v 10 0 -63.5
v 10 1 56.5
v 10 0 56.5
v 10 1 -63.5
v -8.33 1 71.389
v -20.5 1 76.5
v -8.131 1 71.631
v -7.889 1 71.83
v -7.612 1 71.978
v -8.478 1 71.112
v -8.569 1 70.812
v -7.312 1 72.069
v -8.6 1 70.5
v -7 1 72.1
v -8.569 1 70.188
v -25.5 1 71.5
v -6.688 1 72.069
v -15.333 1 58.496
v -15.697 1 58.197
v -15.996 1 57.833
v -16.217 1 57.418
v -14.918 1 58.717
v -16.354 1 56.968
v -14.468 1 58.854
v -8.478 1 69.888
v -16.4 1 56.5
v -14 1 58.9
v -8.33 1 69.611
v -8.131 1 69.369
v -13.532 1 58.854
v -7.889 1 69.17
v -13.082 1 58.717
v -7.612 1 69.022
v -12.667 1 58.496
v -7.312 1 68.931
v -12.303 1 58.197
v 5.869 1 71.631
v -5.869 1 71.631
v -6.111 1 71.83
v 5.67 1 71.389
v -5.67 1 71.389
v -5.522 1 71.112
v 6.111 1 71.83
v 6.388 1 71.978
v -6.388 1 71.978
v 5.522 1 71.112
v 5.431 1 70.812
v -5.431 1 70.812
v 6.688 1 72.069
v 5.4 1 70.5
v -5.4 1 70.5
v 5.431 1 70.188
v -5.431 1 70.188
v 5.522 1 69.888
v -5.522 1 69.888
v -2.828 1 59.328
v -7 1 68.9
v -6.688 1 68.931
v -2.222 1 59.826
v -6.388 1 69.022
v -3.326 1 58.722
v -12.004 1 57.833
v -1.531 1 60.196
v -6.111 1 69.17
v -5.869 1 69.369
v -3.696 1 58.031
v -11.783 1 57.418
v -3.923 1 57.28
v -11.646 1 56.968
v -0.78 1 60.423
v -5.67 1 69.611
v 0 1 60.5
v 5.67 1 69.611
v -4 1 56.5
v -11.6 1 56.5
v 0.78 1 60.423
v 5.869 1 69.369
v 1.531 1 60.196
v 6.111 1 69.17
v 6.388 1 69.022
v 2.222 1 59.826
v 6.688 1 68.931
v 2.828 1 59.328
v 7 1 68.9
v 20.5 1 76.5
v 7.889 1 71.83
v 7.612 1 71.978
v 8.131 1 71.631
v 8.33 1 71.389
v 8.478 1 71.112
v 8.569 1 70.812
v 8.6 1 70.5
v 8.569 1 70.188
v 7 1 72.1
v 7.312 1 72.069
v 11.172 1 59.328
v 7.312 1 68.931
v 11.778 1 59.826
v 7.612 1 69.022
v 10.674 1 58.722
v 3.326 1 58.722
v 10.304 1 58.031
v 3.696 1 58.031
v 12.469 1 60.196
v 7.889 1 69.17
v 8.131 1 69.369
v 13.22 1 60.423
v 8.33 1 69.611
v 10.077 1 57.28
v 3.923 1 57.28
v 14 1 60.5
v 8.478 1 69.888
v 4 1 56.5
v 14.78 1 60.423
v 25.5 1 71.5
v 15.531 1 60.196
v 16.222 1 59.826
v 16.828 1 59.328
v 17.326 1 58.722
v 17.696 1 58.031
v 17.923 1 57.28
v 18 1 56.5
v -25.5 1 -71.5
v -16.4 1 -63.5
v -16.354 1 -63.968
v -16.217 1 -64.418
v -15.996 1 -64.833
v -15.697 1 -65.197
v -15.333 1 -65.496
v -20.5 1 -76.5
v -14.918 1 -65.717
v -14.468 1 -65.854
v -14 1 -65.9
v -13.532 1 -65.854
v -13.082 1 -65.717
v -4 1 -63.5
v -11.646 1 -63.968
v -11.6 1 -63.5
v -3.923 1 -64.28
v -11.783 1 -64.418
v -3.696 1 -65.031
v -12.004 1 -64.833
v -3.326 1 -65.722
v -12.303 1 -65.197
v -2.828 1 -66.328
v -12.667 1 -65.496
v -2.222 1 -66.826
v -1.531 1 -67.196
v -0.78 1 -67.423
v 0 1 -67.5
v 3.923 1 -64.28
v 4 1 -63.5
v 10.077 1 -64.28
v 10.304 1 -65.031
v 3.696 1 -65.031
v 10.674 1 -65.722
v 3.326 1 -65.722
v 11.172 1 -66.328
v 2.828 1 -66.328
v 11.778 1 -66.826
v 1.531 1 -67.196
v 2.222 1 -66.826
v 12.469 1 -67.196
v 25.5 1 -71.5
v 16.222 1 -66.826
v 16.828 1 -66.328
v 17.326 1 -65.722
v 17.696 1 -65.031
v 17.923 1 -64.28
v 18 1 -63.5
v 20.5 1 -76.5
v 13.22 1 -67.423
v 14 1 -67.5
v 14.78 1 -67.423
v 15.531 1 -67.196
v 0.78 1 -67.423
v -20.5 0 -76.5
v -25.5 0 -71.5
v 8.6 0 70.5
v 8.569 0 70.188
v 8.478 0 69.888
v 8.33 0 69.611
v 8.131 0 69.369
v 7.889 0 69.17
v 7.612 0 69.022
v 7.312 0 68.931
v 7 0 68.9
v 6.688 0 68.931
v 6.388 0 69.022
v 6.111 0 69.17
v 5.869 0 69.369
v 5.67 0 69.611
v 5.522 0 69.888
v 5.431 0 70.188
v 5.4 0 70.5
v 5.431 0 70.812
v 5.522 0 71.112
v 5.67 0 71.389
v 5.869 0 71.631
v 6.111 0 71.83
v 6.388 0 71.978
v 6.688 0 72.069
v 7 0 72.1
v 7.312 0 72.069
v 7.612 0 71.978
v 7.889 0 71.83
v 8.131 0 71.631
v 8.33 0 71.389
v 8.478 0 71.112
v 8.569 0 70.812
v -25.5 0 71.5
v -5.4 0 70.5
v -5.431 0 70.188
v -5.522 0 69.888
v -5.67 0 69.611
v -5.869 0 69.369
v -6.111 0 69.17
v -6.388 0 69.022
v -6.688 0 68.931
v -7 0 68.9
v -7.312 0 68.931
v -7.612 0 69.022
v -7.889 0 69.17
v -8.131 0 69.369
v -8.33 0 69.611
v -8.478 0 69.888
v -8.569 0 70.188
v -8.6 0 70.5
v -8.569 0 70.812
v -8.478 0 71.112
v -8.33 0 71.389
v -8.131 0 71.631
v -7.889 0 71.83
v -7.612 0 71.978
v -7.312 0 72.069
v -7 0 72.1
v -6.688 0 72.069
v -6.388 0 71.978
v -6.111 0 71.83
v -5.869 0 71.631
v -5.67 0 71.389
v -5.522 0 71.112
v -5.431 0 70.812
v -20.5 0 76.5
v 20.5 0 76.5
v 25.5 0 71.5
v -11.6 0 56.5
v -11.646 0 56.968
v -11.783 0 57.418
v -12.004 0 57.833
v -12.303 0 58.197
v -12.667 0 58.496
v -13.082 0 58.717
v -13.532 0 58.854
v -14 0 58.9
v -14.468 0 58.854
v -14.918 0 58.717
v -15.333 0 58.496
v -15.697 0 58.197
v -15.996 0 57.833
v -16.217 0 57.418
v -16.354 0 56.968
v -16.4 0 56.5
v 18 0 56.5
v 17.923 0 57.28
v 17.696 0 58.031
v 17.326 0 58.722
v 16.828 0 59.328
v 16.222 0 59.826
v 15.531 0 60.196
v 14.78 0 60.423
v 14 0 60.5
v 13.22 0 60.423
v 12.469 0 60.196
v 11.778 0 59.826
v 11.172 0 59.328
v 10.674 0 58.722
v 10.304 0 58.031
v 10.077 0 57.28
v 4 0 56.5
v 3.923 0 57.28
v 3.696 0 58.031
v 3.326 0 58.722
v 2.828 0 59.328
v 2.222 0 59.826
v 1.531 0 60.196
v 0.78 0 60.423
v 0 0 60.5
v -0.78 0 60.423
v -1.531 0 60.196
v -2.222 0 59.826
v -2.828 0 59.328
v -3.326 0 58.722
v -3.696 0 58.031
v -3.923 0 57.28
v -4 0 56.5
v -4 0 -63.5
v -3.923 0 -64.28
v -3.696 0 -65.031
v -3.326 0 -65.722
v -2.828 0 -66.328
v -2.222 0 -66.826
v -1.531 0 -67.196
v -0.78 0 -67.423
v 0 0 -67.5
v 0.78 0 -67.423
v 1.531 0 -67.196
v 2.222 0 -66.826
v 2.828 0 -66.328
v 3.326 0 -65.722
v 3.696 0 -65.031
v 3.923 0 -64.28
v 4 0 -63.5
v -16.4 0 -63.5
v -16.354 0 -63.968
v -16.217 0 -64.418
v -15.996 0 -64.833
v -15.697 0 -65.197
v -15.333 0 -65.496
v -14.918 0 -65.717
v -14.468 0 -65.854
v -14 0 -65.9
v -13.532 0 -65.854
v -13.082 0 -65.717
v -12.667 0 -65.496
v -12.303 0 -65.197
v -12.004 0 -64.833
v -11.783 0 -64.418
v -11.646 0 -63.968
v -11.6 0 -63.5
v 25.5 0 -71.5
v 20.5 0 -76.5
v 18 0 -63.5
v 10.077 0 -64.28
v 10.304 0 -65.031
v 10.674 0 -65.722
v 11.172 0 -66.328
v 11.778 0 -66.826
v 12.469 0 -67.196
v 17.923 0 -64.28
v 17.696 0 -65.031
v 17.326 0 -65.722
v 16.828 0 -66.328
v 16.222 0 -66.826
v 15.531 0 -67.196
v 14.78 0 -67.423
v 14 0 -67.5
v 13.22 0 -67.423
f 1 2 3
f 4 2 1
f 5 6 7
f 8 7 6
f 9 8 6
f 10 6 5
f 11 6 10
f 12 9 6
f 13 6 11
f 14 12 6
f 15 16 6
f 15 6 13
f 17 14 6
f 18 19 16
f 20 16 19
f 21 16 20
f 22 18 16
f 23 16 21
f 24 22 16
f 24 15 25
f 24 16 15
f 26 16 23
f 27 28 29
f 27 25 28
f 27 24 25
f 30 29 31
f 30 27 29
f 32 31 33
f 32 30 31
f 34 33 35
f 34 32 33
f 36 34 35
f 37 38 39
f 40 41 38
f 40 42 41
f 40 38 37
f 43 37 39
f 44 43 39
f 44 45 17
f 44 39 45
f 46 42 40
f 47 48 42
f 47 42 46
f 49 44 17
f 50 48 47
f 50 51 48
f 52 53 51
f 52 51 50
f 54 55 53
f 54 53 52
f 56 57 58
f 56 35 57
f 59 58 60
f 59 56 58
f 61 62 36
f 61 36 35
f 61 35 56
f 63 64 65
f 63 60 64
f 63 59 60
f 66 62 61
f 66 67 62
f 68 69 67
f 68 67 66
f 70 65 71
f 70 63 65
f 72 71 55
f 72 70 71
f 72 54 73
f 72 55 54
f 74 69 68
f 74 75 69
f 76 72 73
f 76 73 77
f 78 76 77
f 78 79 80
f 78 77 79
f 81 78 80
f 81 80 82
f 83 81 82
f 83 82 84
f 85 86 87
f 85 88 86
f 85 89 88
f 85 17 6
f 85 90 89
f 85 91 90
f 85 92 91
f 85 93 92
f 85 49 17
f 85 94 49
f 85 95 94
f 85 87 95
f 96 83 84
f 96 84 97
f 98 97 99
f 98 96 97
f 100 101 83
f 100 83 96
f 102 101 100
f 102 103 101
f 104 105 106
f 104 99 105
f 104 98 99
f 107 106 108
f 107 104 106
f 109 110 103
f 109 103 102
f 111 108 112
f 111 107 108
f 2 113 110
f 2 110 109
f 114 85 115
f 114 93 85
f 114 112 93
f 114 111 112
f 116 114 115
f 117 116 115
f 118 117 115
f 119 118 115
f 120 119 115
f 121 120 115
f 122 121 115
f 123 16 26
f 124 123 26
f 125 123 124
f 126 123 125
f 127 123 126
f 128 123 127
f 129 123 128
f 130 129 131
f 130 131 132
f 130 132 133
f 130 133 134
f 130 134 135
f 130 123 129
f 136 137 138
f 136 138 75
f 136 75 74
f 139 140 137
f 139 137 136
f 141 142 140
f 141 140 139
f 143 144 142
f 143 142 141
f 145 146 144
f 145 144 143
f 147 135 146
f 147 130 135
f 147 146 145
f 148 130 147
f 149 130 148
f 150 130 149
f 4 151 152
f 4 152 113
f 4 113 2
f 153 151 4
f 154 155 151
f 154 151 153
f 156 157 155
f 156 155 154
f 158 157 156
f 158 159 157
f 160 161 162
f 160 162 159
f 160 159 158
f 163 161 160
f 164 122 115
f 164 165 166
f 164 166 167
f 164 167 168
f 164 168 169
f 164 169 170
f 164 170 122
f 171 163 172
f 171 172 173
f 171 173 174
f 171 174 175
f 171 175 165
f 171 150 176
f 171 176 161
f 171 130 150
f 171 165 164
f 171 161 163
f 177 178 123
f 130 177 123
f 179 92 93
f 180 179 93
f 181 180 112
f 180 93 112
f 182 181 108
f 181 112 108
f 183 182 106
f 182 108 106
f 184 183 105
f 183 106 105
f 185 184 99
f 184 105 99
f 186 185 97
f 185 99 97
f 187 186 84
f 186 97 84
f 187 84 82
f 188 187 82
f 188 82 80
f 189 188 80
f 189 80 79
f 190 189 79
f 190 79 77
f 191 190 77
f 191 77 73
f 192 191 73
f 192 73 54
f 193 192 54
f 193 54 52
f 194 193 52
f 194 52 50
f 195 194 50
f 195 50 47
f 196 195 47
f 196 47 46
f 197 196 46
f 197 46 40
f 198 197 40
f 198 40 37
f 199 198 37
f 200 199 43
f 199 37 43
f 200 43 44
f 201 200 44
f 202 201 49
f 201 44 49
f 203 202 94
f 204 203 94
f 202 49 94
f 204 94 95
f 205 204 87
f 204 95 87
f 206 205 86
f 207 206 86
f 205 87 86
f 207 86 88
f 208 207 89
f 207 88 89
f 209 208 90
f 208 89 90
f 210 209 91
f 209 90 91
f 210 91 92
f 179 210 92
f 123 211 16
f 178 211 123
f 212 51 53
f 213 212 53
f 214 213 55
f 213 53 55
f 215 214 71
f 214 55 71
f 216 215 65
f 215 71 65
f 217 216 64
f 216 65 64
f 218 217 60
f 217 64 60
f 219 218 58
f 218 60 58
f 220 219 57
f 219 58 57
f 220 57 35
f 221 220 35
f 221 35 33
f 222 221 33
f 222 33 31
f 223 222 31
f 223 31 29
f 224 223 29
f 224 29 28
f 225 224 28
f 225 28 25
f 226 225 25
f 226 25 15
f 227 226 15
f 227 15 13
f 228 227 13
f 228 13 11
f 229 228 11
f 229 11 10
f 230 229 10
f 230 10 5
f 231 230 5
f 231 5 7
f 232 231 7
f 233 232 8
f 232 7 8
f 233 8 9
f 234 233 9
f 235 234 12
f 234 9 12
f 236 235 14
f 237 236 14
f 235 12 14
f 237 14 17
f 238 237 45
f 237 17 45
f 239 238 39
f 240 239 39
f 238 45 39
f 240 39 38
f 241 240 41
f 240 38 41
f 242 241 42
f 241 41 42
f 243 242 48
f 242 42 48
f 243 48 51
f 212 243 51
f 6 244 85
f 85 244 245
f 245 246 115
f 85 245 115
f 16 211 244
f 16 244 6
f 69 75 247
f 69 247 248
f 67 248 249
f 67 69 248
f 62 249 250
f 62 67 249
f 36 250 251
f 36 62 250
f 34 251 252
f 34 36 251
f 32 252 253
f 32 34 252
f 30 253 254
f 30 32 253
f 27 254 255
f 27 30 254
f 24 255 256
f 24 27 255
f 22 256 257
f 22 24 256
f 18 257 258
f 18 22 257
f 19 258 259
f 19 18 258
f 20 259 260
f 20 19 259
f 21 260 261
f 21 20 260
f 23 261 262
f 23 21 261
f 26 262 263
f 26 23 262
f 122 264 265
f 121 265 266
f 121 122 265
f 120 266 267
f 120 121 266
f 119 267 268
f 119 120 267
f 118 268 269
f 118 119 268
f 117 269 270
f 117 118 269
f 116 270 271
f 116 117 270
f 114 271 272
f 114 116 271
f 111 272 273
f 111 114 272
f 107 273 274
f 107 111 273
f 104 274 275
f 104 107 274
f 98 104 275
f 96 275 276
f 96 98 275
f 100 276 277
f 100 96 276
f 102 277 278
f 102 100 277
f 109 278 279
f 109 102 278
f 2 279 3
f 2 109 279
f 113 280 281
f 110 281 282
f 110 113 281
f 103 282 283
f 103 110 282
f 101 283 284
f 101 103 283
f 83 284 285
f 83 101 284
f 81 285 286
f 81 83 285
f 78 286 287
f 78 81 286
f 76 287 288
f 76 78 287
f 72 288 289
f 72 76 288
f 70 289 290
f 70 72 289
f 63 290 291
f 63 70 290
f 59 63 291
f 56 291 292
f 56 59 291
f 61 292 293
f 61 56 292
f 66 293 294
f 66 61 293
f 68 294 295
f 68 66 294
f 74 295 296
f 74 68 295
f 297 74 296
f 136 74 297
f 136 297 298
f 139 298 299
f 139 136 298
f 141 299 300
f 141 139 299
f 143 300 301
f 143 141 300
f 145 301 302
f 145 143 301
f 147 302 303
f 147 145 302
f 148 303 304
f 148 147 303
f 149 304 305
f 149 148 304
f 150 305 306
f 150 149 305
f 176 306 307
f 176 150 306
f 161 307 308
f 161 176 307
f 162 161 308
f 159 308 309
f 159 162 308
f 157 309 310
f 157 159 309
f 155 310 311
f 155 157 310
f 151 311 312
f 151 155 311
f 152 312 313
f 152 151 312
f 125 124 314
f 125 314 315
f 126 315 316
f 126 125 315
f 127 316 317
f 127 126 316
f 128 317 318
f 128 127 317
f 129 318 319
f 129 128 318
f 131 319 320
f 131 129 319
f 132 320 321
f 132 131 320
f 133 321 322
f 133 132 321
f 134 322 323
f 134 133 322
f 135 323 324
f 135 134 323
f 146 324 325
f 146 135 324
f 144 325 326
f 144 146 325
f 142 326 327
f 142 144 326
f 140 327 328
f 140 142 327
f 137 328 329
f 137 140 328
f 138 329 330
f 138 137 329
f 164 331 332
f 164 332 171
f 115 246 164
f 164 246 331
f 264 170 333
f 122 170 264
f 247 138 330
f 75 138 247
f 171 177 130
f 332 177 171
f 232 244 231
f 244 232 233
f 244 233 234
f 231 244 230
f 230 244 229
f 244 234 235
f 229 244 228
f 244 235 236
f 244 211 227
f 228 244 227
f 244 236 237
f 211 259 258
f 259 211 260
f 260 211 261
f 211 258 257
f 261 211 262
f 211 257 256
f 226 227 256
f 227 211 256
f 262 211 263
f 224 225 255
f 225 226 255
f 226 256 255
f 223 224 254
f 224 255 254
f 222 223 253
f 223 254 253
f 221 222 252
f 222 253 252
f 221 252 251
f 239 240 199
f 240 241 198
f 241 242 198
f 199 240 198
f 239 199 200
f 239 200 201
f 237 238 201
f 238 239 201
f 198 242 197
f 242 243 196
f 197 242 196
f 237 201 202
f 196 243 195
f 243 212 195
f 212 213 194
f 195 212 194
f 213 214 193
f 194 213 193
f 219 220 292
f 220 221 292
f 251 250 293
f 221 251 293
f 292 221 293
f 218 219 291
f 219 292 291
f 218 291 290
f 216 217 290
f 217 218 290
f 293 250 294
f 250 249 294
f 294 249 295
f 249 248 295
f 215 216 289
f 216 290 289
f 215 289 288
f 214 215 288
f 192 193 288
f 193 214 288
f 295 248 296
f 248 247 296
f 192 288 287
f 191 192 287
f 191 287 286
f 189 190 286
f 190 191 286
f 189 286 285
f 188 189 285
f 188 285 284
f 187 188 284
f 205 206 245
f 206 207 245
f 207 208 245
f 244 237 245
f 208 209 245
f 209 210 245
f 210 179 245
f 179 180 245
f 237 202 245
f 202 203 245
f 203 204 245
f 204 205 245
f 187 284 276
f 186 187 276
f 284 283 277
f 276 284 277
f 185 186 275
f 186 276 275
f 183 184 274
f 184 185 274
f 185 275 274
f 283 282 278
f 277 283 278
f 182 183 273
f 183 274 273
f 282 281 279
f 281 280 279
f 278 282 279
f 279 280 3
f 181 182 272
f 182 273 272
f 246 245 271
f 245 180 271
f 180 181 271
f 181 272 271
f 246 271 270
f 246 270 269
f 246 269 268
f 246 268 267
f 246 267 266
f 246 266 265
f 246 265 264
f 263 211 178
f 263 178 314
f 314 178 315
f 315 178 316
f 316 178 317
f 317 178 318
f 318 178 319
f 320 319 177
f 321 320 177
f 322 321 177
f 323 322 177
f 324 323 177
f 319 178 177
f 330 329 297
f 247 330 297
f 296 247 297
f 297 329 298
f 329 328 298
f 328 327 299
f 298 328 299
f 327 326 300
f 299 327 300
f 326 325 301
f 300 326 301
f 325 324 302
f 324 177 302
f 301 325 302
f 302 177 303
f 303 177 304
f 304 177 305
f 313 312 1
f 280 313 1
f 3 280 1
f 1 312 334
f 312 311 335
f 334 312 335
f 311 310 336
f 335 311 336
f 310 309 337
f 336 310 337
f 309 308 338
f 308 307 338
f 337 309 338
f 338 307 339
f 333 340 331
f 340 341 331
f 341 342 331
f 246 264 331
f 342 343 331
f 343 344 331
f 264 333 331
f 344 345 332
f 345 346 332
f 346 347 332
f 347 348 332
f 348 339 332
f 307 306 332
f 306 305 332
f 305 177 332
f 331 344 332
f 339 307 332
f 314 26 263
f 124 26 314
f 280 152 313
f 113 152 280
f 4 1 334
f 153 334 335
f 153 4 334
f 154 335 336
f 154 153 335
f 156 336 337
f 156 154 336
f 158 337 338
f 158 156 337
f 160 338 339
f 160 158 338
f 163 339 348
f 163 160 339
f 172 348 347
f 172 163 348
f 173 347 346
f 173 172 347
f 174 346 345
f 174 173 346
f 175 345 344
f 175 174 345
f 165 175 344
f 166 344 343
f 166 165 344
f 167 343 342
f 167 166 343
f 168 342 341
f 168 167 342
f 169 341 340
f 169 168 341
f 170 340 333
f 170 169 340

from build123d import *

# Parameters (mm, degrees)
SKETCH_1_W          = 51
SKETCH_1_H          = 153
EXTRUDE_1_DEPTH     = 1
SKETCH_2_R          = 1.6
CUT_EXTRUDE_1_DEPTH = 2
CHAMFER_1_SIZE      = 5
EXTRUDE_2_DEPTH     = 1


with BuildPart() as part:
    # 草图1 → 凸台-拉伸1 (new body)
    with BuildSketch(Plane(origin=(0, 0, 0), x_dir=(1, 0, 0), z_dir=(0, 1, 0))):
        Rectangle(SKETCH_1_W, SKETCH_1_H)
    extrude(amount=EXTRUDE_1_DEPTH)

    # 草图2 → 切除-拉伸1 (cut, through all)
    with BuildSketch(Plane(origin=(0, 1, 0), x_dir=(1, 0, 0), z_dir=(0, 1, 0))):
        with Locations((-7, -70.5)):
            Circle(SKETCH_2_R)
        with Locations((7, -70.5)):
            Circle(SKETCH_2_R)
        with BuildLine():
            Line((-10, 63.5), (-10, -56.5))
            ThreePointArc((-10, -56.5), (-14, -60.5), (-18, -56.5))
            Line((-18, -56.5), (-18, 63.5))
            ThreePointArc((-18, 63.5), (-14, 67.5), (-10, 63.5))
        make_face()
        with BuildLine():
            Line((4, 63.5), (4, -56.5))
            ThreePointArc((4, -56.5), (0, -60.5), (-4, -56.5))
            Line((-4, -56.5), (-4, 63.5))
            ThreePointArc((-4, 63.5), (0, 67.5), (4, 63.5))
        make_face()
        with BuildLine():
            Line((18, 63.5), (18, -56.5))
            ThreePointArc((18, -56.5), (14, -60.5), (10, -56.5))
            Line((10, -56.5), (10, 63.5))
            ThreePointArc((10, 63.5), (14, 67.5), (18, 63.5))
        make_face()
    extrude(amount=-CUT_EXTRUDE_1_DEPTH, mode=Mode.SUBTRACT)

    # 倒角1
    chamfer_1_edges = [part.edges().sort_by_distance(p)[0] for p in [
        (-25.5, 0.5, -76.5),
        (25.5, 0.5, -76.5),
        (25.5, 0.5, 76.5),
        (-25.5, 0.5, 76.5),
    ]]
    chamfer(chamfer_1_edges, length=CHAMFER_1_SIZE)

    # 草图4 → 凸台-拉伸2 (add)
    with BuildSketch(Plane(origin=(0, 1, 0), x_dir=(1, 0, 0), z_dir=(0, 1, 0))):
        with BuildLine():
            Line((-10, -56.5), (-10, 63.5))
            ThreePointArc((-10, 63.5), (-14, 67.5), (-18, 63.5))
            Line((-18, 63.5), (-18, -56.5))
            ThreePointArc((-18, -56.5), (-14, -60.5), (-10, -56.5))
        make_face()
        with BuildLine():
            Line((-11.6, 63.5), (-11.6, -56.5))
            ThreePointArc((-11.6, -56.5), (-14, -58.9), (-16.4, -56.5))
            Line((-16.4, -56.5), (-16.4, 63.5))
            ThreePointArc((-16.4, 63.5), (-14, 65.9), (-11.6, 63.5))
        make_face(mode=Mode.SUBTRACT)
    extrude(amount=-EXTRUDE_2_DEPTH)


solid = part.part
